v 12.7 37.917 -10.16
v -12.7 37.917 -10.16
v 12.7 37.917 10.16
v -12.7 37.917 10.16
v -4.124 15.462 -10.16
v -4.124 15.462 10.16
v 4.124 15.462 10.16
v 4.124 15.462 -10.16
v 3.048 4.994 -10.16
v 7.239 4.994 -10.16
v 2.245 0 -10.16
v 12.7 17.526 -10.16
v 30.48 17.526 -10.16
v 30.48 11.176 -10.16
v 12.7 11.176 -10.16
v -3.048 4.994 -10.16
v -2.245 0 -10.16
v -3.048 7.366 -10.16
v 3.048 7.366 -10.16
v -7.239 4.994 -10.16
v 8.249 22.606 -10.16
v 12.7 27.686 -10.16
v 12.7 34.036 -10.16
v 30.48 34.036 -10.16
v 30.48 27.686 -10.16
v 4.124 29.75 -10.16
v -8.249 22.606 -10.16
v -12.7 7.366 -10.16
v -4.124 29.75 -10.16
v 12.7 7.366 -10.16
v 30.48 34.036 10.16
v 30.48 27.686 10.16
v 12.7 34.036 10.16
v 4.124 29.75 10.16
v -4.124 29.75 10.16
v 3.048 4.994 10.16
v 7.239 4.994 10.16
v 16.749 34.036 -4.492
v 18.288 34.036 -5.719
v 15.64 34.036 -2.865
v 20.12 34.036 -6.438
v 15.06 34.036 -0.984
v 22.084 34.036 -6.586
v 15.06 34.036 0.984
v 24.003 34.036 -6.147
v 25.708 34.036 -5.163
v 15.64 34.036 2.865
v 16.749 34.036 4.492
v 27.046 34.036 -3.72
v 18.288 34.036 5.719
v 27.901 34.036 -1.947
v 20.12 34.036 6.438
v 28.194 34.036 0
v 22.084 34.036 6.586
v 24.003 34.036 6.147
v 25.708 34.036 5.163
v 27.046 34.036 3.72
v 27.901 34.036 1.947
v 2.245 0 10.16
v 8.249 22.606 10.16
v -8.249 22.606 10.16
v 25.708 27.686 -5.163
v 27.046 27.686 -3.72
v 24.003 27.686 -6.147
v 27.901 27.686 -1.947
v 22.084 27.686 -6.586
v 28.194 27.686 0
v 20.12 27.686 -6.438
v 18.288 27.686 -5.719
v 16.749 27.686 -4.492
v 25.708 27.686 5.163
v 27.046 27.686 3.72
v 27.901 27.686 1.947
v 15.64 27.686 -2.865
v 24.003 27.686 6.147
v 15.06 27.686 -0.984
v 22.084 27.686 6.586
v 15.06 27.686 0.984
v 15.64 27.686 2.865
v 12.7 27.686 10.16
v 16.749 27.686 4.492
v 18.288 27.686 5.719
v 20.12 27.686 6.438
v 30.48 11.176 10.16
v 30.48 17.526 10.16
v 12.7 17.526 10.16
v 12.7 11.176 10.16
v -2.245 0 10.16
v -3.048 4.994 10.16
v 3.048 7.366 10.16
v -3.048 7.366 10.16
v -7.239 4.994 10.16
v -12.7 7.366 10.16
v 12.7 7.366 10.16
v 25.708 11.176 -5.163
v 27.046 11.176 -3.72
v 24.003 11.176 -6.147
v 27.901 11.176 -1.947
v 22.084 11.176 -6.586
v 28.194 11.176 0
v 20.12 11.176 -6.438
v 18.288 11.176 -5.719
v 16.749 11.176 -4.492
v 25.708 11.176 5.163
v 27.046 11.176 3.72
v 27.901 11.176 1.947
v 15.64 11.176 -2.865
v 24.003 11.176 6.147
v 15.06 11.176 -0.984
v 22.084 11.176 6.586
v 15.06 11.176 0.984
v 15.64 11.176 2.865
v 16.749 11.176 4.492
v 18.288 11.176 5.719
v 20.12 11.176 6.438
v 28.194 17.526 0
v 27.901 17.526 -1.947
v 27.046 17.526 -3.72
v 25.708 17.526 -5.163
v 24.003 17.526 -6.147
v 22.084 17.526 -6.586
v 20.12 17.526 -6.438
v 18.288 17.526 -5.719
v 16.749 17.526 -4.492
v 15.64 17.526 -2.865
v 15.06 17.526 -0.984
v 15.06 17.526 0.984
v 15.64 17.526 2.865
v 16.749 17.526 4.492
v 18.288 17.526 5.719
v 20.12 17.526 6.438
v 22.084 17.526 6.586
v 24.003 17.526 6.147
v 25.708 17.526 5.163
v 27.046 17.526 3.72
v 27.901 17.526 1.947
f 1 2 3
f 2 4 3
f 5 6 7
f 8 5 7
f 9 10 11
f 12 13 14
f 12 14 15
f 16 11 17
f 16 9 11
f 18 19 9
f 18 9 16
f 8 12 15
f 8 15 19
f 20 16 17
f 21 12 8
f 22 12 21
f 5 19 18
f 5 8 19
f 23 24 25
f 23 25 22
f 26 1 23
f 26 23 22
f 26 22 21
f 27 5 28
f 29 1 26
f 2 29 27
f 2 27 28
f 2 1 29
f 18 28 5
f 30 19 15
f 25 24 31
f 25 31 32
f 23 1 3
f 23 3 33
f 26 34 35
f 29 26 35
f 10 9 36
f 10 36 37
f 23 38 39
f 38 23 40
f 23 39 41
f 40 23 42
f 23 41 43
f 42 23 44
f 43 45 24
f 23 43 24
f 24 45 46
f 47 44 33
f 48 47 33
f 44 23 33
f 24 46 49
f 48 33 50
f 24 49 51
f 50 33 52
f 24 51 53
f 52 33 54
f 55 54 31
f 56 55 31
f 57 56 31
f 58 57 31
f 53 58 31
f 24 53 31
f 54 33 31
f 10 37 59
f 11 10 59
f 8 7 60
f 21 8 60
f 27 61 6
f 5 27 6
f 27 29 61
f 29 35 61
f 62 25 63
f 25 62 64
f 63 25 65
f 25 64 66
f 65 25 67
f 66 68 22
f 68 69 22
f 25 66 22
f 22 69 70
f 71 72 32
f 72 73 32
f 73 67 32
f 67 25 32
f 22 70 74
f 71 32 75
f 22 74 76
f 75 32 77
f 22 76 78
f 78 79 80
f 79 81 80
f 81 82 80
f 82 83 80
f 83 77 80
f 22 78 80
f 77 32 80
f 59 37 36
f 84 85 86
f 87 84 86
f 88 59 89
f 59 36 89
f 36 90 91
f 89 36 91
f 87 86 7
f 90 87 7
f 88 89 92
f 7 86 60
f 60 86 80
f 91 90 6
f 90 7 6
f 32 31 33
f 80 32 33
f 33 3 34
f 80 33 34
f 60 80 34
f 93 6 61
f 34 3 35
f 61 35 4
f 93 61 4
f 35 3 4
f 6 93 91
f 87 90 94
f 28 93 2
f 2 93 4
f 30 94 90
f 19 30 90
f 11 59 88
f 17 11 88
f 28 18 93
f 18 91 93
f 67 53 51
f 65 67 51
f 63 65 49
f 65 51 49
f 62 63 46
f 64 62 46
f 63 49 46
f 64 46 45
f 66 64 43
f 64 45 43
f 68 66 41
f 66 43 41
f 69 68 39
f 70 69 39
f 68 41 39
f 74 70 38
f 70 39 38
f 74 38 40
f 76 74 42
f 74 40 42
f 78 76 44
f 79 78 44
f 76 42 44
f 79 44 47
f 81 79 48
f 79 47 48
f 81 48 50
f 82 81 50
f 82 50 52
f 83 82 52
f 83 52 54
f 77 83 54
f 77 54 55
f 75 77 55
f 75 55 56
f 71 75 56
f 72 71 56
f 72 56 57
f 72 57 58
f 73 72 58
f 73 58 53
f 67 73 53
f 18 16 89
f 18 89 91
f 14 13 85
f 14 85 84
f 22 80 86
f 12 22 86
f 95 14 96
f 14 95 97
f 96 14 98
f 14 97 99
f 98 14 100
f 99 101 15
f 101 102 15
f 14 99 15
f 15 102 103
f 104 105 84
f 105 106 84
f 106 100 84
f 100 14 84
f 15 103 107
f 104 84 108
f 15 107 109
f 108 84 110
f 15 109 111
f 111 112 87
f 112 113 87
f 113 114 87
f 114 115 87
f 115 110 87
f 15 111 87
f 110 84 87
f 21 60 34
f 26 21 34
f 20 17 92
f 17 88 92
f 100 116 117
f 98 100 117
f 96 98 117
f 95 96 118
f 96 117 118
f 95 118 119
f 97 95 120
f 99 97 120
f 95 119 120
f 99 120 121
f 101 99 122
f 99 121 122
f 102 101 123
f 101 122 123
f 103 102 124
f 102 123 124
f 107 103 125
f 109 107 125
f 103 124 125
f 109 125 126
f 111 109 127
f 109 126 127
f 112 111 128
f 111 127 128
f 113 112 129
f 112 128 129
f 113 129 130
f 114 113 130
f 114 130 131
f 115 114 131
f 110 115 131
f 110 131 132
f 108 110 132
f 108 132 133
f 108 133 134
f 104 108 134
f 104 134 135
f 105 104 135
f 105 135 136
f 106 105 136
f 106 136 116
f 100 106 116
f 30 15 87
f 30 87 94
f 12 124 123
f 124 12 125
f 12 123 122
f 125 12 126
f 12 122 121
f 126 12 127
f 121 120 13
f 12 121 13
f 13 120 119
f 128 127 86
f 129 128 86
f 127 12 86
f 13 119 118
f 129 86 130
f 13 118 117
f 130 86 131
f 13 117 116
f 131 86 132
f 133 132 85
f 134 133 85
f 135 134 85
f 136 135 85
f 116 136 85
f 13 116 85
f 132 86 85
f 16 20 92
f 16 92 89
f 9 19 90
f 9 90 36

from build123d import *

# Parameters (mm, degrees)
BOSS_EXTRUDE1_DEPTH = 10.16
SKETCH2_R           = 6.604
CUT_EXTRUDE1_DEPTH  = 38.916561489


with BuildPart() as part:
    # Sketch1 → Boss-Extrude1 (new body, symmetric)
    with BuildSketch(Plane.XY):
        Polygon((2.24536, 0), (-2.24536, 0), (-7.239, 4.99364), (-3.048, 4.99364), (-3.048, 7.366), (-12.7, 7.366), (-12.7, 37.916561489), (12.7, 37.916561489), (12.7, 34.036), (30.48, 34.036), (30.48, 27.686), (12.7, 27.686), (12.7, 17.526), (30.48, 17.526), (30.48, 11.176), (12.7, 11.176), (12.7, 7.366), (3.048, 7.366), (3.048, 4.99364), (7.239, 4.99364), align=None)
        Polygon((-4.124445986, 29.74975), (-8.248891971, 22.606), (-4.124445986, 15.46225), (4.124445986, 15.46225), (8.248891971, 22.606), (4.124445986, 29.74975), align=None, mode=Mode.SUBTRACT)
    extrude(amount=BOSS_EXTRUDE1_DEPTH, both=True)

    # Sketch2 → Cut-Extrude1 (cut, through all)
    with BuildSketch(Plane(origin=(0, 37.916561489, 0), x_dir=(1, 0, 0), z_dir=(0, 1, 0))):
        with Locations((21.59, 0)):
            Circle(SKETCH2_R)
    extrude(amount=-CUT_EXTRUDE1_DEPTH, mode=Mode.SUBTRACT)


solid = part.part
